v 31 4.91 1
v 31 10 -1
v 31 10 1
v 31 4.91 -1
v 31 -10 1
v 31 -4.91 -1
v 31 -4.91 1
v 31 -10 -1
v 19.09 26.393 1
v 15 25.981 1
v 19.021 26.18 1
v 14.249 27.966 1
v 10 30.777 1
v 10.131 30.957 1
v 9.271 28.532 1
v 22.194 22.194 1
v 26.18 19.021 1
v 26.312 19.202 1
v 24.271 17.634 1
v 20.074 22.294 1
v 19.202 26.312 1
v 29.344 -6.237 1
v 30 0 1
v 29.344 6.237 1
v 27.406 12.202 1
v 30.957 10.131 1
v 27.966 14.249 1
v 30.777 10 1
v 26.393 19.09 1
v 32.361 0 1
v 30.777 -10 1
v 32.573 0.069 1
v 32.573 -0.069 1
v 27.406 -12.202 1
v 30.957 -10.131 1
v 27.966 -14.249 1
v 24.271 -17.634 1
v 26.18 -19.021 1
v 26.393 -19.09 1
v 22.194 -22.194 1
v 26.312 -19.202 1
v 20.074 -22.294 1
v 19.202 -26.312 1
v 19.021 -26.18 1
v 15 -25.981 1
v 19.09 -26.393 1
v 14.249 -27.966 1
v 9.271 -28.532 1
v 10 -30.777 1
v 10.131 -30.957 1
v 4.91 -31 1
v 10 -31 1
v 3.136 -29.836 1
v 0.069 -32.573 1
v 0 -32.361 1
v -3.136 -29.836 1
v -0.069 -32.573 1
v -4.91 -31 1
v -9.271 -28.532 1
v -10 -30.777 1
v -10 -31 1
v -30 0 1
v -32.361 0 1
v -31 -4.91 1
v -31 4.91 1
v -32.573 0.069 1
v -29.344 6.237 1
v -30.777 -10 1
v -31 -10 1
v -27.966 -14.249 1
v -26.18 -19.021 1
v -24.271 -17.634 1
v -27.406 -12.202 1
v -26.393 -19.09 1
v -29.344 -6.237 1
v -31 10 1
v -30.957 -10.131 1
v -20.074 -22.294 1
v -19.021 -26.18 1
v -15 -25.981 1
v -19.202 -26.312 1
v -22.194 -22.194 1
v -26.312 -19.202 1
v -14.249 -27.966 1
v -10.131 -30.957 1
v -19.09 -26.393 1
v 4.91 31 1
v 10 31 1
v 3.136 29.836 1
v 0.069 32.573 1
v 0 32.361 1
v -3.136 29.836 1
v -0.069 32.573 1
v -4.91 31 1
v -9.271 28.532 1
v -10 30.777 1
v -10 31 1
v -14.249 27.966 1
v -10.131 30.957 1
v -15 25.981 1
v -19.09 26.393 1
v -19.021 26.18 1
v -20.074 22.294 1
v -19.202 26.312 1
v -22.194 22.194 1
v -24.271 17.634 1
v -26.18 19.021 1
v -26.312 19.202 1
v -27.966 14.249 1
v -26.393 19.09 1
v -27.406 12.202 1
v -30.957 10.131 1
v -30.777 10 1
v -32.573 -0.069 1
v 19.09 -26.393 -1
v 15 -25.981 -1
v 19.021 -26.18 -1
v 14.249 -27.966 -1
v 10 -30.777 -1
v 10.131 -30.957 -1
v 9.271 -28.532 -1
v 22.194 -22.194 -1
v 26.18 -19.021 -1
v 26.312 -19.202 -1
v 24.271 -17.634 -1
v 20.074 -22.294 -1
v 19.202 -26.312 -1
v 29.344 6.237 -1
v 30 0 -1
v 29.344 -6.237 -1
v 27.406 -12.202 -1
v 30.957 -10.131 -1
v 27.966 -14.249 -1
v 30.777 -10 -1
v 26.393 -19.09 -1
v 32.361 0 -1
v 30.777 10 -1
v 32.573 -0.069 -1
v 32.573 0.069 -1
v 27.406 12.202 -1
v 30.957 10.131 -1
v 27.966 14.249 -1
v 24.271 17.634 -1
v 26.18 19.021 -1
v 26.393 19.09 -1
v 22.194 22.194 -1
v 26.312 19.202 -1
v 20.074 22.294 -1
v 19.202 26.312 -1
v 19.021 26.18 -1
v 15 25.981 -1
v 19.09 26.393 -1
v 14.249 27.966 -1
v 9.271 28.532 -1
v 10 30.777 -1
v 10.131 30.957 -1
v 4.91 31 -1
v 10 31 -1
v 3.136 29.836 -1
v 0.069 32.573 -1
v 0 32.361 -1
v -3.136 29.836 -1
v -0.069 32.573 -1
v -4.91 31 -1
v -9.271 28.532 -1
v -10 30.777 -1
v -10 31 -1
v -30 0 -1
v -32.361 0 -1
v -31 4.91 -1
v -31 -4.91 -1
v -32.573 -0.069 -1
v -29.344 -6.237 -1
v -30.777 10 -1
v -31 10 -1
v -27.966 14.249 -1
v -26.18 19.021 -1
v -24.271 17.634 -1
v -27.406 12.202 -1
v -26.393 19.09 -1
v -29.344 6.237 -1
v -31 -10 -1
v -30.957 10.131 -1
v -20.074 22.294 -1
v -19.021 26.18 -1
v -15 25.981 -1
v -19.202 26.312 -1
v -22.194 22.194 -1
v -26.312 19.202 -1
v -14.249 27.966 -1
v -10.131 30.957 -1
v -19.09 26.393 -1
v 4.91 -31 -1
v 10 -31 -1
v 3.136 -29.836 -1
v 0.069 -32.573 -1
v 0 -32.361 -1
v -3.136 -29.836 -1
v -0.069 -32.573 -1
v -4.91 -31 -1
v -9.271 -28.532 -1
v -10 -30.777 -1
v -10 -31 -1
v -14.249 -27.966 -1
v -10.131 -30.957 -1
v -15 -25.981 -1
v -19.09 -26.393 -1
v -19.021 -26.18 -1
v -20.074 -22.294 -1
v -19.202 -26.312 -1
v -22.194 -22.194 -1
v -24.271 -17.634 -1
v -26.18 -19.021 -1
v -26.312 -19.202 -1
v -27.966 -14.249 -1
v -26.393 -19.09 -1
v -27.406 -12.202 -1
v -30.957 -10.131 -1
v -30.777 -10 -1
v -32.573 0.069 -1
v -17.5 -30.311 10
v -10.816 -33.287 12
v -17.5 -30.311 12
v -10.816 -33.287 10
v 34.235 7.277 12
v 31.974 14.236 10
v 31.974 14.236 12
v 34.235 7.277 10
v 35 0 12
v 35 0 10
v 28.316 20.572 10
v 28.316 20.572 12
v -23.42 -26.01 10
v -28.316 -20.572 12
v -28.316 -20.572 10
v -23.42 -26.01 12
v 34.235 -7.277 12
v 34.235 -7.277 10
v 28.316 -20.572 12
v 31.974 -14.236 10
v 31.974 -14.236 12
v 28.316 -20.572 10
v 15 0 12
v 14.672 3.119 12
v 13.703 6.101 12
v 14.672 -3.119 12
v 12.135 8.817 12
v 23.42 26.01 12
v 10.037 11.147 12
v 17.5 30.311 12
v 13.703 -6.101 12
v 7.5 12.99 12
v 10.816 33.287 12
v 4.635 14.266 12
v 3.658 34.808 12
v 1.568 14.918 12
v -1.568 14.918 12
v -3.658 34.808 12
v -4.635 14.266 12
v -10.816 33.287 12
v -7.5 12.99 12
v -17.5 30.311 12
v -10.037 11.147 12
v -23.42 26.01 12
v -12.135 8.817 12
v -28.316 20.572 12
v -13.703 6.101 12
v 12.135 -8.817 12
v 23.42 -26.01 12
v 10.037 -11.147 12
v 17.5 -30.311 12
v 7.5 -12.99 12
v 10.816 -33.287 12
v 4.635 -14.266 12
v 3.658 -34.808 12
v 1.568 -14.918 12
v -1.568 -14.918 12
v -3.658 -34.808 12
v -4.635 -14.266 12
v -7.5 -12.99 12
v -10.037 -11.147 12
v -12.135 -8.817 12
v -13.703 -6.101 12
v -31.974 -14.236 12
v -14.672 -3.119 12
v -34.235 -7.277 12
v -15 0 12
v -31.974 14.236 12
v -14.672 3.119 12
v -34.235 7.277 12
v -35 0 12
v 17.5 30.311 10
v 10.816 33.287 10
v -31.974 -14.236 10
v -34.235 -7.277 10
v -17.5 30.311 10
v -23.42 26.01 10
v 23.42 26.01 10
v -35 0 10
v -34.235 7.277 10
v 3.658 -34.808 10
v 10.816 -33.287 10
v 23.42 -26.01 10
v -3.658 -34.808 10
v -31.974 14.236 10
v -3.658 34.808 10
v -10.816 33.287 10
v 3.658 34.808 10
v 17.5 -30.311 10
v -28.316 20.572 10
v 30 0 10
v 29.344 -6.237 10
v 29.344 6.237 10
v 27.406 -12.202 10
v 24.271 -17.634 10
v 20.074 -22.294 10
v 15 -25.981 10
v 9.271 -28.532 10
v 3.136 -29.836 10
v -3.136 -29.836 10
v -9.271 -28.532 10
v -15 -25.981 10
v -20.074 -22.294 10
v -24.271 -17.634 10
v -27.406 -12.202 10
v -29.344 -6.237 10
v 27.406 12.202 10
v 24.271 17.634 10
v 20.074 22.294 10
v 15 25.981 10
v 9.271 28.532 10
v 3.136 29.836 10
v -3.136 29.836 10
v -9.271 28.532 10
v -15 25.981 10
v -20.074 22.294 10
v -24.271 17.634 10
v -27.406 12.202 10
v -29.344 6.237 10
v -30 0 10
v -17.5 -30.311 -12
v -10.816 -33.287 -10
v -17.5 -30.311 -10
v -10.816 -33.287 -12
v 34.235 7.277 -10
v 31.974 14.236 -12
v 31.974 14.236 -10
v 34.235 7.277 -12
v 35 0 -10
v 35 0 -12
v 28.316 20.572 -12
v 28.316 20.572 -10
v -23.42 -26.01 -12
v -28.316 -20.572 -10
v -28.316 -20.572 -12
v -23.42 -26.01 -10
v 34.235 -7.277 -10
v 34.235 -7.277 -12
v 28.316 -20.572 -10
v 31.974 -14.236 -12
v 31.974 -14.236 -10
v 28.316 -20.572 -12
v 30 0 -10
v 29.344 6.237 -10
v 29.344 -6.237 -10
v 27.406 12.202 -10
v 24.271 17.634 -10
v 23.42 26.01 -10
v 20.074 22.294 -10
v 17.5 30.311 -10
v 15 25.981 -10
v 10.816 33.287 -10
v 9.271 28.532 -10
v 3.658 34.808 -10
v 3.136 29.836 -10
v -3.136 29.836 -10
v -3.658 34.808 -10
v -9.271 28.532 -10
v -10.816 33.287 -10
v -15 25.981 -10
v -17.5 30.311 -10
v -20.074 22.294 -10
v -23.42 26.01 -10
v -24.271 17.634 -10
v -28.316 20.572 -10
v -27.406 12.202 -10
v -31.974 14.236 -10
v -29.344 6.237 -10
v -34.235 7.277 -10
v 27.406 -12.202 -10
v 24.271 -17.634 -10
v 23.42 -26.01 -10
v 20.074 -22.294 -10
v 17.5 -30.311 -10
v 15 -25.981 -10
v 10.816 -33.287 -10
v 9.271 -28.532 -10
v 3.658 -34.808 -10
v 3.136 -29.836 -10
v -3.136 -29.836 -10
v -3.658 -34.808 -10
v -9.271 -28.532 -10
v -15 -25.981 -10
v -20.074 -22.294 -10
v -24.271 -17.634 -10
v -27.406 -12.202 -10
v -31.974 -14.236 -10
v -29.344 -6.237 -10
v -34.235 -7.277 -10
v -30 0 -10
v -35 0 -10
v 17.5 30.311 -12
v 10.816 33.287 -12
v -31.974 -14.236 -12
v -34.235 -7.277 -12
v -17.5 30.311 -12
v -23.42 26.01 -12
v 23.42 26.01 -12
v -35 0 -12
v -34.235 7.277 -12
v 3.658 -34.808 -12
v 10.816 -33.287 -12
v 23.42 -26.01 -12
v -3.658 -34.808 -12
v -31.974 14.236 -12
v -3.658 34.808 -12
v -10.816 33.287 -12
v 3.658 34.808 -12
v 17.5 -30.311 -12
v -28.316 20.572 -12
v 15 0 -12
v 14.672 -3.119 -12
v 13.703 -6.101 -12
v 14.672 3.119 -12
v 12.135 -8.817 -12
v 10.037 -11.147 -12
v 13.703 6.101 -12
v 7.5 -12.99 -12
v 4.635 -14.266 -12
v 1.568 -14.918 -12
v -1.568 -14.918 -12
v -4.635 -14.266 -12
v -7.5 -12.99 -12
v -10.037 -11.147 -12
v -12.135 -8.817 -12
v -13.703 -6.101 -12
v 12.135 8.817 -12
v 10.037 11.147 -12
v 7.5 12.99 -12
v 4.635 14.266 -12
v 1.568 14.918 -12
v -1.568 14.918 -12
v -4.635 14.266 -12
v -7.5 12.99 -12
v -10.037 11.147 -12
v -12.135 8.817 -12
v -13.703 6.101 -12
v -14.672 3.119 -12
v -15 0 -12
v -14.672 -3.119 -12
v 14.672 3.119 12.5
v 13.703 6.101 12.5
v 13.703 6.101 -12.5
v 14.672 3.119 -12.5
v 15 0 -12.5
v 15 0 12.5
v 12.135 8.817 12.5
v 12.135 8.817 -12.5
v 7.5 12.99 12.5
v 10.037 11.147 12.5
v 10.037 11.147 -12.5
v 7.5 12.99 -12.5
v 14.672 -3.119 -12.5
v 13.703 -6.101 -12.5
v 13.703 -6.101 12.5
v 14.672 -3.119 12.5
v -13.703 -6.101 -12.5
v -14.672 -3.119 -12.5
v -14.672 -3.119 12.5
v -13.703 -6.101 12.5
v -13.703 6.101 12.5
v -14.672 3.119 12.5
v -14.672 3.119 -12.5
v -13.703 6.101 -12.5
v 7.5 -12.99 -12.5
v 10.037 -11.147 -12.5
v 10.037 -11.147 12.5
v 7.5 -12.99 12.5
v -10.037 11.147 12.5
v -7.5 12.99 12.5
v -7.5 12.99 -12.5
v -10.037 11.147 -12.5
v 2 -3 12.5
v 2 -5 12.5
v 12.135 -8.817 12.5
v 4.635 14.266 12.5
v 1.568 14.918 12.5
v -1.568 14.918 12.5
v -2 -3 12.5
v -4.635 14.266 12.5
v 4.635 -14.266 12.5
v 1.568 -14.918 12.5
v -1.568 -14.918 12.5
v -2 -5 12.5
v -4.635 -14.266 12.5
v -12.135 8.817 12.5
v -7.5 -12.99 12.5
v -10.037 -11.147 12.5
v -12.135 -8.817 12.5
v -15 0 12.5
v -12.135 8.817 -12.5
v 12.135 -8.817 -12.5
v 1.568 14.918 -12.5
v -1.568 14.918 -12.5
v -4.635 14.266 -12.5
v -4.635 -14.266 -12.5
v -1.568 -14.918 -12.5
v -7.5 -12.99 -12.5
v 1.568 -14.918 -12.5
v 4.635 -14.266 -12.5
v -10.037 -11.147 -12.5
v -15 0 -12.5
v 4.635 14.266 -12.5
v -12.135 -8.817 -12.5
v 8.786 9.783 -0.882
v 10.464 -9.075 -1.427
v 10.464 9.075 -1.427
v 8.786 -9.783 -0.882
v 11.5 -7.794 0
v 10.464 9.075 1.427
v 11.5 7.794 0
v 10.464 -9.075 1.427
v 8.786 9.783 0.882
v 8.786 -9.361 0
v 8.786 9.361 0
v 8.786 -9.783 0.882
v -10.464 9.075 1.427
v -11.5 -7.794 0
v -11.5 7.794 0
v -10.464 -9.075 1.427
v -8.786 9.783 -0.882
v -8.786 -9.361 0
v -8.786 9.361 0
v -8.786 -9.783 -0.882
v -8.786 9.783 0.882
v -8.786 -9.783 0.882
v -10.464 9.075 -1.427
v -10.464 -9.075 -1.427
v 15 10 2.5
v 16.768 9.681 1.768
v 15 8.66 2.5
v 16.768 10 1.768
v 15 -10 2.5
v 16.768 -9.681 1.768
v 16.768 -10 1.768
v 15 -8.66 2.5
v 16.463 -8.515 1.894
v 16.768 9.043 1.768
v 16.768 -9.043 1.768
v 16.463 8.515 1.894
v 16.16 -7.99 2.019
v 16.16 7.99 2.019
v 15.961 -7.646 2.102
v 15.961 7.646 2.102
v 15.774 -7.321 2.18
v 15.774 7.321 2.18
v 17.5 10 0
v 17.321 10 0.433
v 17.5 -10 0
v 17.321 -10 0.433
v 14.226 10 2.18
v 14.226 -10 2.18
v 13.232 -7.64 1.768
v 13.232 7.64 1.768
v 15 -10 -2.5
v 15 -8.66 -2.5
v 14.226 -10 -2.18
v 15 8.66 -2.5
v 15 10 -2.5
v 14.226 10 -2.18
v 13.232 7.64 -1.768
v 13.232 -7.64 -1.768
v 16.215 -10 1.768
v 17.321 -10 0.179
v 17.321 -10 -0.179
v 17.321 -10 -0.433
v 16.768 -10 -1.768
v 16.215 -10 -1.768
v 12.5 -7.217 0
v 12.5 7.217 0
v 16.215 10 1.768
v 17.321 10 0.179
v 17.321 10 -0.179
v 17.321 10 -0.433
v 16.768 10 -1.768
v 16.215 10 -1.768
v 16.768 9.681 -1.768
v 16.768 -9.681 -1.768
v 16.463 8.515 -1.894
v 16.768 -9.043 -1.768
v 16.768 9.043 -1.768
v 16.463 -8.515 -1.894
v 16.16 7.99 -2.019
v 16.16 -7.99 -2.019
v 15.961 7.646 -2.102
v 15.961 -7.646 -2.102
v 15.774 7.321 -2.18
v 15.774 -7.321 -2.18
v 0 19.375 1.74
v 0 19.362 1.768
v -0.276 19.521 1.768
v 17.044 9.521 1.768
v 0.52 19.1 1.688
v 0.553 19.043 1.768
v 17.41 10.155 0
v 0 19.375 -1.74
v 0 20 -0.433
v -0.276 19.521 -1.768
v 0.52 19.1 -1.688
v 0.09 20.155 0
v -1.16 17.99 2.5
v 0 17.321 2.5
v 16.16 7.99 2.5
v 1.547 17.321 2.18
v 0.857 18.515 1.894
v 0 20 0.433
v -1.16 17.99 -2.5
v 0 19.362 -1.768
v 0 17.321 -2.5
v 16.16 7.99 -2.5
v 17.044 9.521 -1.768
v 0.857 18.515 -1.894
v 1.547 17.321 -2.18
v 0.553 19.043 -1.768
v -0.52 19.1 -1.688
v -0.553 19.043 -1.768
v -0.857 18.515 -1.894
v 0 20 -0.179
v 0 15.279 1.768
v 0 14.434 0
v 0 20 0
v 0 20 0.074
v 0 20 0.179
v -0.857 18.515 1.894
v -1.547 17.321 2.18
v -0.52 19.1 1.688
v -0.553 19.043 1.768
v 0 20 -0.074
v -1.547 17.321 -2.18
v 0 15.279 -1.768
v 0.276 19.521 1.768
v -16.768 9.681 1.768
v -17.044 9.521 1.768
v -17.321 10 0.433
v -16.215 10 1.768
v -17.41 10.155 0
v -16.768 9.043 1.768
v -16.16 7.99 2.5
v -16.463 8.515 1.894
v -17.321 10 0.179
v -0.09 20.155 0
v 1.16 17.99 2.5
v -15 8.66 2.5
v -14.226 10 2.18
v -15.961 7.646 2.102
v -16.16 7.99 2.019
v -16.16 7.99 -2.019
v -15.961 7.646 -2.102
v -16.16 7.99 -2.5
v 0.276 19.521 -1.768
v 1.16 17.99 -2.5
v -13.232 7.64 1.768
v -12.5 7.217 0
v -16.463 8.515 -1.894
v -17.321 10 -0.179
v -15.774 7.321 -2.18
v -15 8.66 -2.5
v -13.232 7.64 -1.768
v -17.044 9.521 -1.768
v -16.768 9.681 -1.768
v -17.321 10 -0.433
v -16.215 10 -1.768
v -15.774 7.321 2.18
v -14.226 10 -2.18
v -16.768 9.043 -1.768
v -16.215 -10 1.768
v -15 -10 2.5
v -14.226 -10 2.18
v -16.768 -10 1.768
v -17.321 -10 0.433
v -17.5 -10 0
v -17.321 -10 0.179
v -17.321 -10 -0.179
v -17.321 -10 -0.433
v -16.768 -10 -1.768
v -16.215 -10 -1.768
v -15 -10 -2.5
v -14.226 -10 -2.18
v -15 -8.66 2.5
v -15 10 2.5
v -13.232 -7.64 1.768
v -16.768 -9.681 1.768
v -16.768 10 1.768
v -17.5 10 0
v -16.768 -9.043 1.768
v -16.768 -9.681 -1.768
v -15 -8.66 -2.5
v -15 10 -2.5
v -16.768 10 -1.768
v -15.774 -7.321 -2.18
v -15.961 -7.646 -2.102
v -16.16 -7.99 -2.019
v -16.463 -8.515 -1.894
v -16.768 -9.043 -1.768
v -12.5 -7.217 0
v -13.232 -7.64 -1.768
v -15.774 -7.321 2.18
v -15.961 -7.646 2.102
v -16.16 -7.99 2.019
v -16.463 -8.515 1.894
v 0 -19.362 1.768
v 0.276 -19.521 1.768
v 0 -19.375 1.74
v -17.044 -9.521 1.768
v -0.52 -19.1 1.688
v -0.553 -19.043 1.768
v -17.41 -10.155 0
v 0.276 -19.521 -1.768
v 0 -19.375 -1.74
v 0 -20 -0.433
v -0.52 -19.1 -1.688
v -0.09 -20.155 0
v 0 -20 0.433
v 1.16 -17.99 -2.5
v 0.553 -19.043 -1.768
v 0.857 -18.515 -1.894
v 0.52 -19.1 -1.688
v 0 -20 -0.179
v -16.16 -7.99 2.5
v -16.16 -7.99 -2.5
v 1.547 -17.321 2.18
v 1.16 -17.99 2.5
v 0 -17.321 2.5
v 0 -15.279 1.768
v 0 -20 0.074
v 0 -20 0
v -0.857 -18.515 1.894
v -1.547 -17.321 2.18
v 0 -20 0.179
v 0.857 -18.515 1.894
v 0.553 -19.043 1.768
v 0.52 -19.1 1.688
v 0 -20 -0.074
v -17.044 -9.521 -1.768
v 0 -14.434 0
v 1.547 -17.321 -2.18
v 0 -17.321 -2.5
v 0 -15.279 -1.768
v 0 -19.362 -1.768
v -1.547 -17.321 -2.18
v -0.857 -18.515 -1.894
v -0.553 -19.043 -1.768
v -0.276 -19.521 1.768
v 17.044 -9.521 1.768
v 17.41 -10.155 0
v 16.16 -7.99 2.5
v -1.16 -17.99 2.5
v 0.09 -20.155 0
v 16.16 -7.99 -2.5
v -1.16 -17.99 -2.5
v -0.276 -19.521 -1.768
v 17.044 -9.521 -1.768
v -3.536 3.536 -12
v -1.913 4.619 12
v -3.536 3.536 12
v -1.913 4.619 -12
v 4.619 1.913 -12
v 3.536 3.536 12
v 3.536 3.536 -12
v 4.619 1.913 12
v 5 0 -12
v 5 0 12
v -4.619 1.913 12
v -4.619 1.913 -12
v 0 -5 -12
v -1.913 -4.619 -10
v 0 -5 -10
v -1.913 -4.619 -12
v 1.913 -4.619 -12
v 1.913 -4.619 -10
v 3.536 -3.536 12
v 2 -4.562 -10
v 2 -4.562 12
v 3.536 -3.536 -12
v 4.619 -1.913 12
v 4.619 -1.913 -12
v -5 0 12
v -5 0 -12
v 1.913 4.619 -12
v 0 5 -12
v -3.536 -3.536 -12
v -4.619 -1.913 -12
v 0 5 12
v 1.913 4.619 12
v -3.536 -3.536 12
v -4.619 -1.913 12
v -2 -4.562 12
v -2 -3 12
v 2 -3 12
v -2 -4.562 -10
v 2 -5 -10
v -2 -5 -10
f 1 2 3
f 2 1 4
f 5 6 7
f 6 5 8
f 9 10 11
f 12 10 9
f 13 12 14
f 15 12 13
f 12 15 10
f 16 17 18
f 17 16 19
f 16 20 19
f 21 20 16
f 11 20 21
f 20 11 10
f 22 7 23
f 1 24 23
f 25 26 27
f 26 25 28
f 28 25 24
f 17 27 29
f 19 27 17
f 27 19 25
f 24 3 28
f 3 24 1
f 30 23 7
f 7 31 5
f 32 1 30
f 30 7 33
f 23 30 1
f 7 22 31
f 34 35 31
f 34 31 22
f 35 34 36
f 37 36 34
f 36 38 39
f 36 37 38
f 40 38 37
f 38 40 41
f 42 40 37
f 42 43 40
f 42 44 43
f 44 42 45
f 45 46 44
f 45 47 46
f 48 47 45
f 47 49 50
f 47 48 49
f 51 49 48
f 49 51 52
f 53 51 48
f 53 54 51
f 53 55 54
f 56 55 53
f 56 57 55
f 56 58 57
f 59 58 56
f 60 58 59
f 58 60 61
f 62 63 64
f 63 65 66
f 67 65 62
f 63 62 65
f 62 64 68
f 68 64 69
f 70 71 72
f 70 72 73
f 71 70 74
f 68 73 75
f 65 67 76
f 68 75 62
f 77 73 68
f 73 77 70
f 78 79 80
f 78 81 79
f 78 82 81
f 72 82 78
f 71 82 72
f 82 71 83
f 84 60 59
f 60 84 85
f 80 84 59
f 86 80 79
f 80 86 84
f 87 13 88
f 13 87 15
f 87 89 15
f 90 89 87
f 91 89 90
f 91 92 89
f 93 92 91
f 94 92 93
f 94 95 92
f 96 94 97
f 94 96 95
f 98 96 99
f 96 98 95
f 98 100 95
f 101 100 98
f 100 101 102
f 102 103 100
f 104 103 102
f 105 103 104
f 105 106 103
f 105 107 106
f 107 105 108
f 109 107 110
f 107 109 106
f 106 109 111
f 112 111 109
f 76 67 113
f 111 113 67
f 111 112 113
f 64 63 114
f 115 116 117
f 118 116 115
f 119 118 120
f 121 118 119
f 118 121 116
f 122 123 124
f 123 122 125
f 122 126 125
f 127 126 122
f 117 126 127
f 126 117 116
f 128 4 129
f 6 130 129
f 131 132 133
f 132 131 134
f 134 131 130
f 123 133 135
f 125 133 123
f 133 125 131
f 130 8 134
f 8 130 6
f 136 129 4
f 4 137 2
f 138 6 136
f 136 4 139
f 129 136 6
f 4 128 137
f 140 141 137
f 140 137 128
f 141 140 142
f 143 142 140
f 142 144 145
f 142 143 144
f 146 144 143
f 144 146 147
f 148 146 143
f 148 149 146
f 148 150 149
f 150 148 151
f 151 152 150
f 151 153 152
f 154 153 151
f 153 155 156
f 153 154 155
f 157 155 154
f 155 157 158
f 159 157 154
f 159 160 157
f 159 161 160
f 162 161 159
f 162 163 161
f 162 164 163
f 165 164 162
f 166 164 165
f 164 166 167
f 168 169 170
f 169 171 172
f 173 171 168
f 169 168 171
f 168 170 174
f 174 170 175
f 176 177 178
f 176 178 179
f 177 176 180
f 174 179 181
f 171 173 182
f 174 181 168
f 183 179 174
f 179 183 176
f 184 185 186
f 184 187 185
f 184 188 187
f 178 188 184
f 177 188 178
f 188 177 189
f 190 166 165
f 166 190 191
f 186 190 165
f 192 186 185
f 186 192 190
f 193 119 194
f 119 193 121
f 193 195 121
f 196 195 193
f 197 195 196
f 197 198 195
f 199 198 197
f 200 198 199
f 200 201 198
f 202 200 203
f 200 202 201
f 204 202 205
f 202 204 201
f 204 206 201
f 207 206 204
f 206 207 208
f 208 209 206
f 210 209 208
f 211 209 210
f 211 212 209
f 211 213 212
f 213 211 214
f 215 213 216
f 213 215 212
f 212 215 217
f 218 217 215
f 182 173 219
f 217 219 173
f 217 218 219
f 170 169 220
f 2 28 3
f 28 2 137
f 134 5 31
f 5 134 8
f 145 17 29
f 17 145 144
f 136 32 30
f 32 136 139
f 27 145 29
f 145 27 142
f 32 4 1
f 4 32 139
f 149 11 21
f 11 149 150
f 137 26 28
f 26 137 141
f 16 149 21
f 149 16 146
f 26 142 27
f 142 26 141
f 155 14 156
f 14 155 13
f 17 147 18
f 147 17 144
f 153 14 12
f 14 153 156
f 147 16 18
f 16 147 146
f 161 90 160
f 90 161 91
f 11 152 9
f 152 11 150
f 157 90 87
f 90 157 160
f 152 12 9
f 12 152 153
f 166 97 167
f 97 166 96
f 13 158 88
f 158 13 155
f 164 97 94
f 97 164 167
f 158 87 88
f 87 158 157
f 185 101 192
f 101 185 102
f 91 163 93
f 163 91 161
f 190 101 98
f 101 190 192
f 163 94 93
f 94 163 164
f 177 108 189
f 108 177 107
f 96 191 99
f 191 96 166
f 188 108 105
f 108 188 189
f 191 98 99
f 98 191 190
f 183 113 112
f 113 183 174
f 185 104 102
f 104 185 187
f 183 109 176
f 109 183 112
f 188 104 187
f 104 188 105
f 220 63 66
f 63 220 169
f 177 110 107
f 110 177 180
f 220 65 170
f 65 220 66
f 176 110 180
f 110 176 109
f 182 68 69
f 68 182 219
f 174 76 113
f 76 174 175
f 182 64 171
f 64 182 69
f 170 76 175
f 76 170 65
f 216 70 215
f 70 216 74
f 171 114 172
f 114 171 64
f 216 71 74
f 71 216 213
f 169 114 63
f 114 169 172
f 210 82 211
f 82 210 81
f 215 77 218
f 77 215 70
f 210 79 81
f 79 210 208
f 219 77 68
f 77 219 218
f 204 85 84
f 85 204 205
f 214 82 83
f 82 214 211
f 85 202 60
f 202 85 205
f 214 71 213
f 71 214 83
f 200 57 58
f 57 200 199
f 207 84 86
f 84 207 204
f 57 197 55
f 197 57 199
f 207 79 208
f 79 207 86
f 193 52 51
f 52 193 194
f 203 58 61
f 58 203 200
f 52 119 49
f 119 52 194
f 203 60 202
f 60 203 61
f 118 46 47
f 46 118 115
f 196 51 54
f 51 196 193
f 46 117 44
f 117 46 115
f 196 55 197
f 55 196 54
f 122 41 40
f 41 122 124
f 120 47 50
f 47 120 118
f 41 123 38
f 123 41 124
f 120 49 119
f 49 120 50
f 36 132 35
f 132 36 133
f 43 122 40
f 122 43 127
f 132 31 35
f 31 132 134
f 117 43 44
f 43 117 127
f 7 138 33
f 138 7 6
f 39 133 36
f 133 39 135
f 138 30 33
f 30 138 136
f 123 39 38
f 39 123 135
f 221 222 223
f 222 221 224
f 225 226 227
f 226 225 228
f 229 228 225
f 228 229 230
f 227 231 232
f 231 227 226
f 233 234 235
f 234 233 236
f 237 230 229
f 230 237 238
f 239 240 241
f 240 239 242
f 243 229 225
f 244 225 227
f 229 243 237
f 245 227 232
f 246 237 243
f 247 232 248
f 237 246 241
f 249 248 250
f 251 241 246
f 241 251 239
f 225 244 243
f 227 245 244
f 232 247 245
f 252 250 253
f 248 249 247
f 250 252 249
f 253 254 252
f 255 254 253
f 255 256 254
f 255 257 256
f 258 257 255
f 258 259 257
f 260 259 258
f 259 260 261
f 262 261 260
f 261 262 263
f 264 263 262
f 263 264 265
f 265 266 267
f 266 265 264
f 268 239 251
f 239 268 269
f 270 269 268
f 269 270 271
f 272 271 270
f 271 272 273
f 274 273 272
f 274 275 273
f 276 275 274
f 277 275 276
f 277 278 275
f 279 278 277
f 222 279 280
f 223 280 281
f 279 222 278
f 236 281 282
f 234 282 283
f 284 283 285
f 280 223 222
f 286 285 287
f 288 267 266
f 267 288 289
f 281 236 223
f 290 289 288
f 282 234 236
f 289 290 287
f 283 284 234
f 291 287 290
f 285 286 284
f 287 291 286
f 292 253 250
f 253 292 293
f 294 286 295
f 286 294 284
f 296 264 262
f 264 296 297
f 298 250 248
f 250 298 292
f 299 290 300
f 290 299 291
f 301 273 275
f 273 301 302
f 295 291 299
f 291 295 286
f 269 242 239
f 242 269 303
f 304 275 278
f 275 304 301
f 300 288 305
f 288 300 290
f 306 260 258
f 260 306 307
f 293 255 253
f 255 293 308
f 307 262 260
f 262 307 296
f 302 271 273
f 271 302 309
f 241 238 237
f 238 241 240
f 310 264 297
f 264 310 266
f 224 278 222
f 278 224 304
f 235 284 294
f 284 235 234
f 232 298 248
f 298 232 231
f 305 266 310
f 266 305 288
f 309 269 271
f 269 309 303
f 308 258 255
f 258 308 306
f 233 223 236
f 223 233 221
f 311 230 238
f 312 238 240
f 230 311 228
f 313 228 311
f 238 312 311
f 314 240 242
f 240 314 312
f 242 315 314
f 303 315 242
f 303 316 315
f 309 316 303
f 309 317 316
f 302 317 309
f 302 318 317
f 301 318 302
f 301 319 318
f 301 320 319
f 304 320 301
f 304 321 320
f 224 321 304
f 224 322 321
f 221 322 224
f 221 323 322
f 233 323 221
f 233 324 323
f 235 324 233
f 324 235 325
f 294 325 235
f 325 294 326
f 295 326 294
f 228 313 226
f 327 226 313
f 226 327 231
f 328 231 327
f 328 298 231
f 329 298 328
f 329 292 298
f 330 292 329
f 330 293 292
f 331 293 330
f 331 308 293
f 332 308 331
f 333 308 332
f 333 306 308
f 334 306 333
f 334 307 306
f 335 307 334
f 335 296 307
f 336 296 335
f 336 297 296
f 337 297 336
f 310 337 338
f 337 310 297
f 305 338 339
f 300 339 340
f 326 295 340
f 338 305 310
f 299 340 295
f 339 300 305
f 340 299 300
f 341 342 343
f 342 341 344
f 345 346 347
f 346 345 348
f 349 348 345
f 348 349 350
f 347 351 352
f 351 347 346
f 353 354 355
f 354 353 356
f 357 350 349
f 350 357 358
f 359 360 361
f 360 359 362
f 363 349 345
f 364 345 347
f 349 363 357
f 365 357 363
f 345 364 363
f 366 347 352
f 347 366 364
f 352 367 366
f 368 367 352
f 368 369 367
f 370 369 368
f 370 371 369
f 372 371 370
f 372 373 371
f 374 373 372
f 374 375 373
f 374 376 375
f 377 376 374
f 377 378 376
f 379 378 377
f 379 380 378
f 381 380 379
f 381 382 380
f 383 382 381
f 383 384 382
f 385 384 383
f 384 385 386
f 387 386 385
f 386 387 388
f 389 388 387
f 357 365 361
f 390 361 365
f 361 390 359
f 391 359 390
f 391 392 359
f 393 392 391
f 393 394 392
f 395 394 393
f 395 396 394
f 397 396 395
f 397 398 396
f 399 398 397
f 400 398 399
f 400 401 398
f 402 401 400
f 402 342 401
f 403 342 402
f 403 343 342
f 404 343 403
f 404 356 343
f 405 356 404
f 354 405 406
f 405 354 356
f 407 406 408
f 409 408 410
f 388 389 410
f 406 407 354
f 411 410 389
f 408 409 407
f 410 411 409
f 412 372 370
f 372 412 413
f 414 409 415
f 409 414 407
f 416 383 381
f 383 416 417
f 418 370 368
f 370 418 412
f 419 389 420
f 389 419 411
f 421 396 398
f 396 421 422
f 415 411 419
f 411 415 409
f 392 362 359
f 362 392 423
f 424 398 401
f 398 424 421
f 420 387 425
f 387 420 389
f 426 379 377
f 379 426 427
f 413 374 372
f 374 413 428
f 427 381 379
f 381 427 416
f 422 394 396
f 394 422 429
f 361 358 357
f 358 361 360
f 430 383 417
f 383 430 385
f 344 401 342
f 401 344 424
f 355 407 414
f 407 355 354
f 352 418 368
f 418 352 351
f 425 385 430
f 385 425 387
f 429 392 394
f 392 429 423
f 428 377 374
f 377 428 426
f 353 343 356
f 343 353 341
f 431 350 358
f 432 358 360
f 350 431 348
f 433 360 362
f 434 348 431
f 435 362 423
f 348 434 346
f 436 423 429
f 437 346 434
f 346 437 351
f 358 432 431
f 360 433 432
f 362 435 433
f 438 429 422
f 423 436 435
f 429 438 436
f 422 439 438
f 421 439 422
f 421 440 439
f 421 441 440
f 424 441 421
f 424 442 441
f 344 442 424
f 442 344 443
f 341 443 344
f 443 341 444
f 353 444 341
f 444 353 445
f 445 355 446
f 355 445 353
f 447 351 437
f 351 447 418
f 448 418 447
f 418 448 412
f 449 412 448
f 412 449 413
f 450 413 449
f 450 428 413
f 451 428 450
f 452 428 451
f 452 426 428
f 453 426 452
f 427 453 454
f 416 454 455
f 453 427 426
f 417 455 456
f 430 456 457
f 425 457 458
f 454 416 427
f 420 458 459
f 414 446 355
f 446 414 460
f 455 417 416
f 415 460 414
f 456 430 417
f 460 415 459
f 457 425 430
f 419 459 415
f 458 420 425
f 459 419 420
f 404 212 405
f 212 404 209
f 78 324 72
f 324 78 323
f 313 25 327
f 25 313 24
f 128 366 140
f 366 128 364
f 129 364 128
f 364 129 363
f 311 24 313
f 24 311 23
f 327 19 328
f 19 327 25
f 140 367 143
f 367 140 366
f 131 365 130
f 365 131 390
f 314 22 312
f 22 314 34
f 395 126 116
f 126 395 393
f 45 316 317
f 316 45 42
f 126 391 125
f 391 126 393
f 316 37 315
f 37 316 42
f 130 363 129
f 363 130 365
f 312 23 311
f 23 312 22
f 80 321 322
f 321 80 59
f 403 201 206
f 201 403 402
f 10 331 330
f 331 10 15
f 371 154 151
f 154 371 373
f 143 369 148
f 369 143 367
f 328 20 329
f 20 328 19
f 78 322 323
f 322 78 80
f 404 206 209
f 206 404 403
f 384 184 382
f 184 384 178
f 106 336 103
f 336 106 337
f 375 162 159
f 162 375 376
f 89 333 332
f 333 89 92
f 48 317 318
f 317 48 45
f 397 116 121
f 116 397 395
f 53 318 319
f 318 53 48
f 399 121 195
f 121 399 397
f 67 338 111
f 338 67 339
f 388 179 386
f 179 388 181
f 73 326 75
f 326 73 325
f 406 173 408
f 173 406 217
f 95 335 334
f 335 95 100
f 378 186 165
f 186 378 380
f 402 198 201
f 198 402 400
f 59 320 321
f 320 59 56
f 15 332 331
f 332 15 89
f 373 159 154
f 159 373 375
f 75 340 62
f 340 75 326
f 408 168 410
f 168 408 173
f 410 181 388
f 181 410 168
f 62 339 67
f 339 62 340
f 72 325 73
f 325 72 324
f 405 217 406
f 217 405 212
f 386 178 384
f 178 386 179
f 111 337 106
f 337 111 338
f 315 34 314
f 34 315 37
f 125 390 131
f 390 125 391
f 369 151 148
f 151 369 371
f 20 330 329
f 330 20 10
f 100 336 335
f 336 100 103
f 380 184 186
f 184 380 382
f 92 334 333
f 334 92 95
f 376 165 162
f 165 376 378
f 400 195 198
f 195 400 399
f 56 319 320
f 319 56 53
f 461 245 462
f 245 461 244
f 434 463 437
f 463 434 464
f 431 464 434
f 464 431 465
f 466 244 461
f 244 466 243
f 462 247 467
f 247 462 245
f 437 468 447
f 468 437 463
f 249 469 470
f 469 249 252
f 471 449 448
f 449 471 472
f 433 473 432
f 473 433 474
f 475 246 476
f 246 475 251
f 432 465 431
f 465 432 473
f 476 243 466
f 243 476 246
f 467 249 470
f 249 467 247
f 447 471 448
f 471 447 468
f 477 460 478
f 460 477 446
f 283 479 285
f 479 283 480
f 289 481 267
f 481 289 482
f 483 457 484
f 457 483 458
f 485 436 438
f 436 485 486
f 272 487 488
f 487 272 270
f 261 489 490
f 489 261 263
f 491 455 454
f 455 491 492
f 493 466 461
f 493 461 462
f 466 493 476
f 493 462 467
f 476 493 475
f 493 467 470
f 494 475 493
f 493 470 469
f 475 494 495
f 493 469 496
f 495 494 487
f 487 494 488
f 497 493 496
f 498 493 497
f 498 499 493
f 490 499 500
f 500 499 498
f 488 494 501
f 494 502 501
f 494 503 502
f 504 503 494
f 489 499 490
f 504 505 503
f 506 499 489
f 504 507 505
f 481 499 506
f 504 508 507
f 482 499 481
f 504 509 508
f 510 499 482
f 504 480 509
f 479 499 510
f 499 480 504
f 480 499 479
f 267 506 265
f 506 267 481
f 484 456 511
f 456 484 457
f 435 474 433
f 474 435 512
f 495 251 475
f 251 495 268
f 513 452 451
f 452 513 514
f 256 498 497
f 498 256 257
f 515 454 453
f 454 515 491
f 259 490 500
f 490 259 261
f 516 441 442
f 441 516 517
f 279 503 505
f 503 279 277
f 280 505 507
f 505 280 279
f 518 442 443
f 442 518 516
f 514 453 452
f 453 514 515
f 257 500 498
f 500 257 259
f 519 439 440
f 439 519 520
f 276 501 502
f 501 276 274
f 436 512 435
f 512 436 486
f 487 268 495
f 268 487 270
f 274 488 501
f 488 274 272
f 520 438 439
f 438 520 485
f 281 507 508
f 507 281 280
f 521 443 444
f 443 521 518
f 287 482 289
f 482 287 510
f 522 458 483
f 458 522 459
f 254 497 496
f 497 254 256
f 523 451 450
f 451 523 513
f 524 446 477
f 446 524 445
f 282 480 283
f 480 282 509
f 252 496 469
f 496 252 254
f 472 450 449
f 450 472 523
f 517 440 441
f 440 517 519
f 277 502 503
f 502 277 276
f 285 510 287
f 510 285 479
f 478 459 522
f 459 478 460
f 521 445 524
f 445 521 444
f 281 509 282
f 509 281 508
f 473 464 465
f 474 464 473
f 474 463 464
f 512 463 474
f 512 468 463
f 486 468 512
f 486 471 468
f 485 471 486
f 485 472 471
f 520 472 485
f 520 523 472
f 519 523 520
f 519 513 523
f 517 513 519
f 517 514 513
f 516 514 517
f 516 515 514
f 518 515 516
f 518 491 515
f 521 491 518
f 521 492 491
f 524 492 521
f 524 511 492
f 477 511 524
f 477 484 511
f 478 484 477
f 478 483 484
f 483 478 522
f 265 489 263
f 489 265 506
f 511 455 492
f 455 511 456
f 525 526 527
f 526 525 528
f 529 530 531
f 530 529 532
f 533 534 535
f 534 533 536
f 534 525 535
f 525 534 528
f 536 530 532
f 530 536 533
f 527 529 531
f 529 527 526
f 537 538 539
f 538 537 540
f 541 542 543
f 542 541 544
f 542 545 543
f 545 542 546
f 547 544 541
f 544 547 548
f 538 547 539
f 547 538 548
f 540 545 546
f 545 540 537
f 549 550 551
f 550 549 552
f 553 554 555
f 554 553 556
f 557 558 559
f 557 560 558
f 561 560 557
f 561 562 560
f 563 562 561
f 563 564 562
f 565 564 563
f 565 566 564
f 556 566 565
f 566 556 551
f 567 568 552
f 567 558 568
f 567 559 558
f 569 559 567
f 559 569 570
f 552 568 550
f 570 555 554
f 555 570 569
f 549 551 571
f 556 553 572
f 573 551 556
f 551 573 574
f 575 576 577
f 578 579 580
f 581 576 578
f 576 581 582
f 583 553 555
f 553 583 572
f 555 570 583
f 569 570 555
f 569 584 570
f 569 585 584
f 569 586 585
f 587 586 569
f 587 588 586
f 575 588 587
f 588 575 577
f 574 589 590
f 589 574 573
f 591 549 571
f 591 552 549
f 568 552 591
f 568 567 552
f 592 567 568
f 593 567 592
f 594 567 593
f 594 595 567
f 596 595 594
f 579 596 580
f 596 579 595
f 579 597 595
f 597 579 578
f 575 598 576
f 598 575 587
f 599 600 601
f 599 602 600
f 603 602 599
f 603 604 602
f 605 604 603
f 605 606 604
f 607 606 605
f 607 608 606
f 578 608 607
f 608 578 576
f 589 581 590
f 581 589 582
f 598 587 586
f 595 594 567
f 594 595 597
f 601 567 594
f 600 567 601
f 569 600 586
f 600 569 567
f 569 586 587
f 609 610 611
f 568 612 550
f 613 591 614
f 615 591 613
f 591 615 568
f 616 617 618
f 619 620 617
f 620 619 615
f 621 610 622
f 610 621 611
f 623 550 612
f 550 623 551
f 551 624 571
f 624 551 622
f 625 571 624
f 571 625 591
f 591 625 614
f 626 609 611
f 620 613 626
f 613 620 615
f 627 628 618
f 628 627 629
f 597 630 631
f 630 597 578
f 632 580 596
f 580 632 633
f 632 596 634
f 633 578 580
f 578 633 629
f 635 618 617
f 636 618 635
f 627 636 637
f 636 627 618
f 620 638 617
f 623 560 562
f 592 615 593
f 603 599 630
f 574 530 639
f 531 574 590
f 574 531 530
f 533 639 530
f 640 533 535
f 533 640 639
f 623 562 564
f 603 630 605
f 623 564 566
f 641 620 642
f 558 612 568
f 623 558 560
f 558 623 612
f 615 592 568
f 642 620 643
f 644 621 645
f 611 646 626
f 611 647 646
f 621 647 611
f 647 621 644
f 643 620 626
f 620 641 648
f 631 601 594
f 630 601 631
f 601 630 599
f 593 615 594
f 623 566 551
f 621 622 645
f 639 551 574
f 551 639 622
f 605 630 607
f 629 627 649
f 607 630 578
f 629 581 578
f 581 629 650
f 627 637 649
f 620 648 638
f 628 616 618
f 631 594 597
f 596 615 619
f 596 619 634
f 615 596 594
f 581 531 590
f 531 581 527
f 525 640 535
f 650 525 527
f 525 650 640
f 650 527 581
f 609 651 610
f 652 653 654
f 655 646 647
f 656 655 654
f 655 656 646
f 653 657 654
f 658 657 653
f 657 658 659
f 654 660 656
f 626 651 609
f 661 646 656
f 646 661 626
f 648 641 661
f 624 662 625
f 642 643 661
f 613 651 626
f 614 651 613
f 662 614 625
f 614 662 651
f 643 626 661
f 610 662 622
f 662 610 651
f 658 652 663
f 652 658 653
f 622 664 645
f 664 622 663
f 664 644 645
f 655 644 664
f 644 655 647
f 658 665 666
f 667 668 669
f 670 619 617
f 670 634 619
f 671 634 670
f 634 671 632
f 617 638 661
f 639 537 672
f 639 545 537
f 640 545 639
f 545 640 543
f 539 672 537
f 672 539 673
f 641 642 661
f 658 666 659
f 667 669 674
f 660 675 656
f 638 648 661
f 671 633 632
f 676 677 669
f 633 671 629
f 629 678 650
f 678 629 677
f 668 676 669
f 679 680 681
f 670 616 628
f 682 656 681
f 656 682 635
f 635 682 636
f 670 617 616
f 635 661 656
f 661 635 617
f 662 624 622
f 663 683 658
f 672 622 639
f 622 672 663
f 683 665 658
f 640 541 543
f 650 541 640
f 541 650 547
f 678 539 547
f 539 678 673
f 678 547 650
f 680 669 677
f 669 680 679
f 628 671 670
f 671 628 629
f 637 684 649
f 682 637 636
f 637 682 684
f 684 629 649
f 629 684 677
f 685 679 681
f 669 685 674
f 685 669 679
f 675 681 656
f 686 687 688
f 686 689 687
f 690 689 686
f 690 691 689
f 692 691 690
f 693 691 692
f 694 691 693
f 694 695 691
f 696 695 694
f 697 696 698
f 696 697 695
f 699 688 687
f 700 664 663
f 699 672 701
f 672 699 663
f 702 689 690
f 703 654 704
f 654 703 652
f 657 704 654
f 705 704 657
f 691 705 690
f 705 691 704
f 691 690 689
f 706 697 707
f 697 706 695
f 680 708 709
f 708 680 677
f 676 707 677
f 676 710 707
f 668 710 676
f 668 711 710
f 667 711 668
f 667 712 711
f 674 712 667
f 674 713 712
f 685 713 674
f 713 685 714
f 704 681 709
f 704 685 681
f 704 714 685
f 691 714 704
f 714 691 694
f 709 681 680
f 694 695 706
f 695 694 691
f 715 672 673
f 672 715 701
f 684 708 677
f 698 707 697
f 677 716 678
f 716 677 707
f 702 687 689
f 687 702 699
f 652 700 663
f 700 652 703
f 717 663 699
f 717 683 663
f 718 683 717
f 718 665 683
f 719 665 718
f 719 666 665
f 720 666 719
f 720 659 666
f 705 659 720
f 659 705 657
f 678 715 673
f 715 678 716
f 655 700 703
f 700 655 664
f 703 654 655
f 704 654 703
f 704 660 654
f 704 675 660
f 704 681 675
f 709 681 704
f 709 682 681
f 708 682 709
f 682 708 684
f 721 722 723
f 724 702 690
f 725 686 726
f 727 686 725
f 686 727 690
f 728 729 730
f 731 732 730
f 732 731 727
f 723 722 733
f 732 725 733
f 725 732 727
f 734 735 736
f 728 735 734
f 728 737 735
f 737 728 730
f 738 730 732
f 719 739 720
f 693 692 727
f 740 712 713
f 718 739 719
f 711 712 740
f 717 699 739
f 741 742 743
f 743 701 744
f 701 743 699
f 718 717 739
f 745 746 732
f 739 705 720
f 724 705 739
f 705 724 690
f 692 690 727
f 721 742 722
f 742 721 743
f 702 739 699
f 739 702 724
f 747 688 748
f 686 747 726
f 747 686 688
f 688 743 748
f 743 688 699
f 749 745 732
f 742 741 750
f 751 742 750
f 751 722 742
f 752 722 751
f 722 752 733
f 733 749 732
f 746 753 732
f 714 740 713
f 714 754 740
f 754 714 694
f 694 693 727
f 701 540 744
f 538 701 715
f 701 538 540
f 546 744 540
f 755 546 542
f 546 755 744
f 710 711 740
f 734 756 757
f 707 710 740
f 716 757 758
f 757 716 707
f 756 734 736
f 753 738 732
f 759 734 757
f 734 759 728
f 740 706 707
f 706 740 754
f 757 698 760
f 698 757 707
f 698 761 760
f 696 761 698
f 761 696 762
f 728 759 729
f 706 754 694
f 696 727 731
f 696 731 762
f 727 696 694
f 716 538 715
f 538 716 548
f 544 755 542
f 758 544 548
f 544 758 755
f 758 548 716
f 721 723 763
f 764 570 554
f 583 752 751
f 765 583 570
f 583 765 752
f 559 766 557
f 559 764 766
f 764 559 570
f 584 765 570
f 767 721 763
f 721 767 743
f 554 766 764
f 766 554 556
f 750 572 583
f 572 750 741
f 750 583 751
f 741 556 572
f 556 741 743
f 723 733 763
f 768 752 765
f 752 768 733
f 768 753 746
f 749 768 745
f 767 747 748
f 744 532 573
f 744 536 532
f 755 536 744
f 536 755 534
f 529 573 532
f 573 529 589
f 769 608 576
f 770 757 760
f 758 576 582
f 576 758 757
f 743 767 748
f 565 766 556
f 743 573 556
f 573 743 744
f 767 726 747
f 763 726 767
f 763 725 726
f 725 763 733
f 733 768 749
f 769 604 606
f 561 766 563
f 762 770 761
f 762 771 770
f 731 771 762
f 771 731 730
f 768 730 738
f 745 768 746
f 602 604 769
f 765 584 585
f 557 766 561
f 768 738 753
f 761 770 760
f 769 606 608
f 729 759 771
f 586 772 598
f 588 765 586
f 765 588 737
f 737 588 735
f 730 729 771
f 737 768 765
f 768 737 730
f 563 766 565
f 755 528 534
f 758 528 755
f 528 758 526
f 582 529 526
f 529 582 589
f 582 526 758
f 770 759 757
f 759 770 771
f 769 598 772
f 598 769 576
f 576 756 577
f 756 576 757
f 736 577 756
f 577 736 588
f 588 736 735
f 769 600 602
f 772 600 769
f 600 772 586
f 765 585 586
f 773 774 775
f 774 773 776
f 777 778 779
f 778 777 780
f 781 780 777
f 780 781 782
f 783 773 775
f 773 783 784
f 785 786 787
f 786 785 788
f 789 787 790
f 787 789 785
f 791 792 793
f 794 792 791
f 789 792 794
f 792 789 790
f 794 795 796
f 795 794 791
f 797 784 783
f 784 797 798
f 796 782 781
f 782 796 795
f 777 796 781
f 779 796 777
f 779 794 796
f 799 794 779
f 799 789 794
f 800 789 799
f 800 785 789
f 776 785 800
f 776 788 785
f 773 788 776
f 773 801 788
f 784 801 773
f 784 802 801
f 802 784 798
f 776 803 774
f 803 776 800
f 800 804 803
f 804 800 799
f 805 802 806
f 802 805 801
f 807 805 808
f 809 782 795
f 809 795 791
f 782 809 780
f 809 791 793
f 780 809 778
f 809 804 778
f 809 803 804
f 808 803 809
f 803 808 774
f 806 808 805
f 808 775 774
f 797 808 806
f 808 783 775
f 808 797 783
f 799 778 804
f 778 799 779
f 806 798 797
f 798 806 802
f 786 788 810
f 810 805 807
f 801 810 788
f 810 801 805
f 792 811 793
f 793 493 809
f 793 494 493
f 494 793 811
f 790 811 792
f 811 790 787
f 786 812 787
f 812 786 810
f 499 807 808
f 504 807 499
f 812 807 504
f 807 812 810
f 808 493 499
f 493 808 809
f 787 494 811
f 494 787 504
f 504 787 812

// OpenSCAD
// Parameters
pulley_diameter = 60;
pulley_width = 20;
bore_diameter = 10;
hub_diameter = 30;
hub_length = 25;
flange_thickness = 2;
flange_diameter = pulley_diameter + 10;
tooth_height = 2;
tooth_count = 20;
set_screw_diameter = 3;
set_screw_distance = 5;
keyway_width = 4;
keyway_depth = 2;
lightening_hole_diameter = 5;
lightening_hole_count = 6;

// Main pulley body
module pulley_body() {
    cylinder(d=pulley_diameter, h=pulley_width, center=true);
}

// Belt profile (toothed)
module belt_profile() {
    for (i = [0:tooth_count-1]) {
        rotate([0, 0, i * 360 / tooth_count])
        translate([pulley_diameter/2, 0, 0])
        cube([tooth_height, pulley_width, tooth_height], center=true);
    }
}

// Center bore
module center_bore() {
    cylinder(d=bore_diameter, h=pulley_width + 2*flange_thickness, center=true);
}

// Hub
module hub() {
    translate([0, 0, -hub_length/2])
    cylinder(d=hub_diameter, h=hub_length, center=false);
}

// Flanges
module flanges() {
    translate([0, 0, pulley_width/2])
    cylinder(d=flange_diameter, h=flange_thickness, center=false);
    translate([0, 0, -pulley_width/2 - flange_thickness])
    cylinder(d=flange_diameter, h=flange_thickness, center=false);
}

// Set screw holes
module set_screw_holes() {
    for (i = [0:1]) {
        rotate([0, 0, i * 180])
        translate([hub_diameter/2 - set_screw_distance, 0, 0])
        rotate([90, 0, 0])
        cylinder(d=set_screw_diameter, h=hub_length, center=true);
    }
}

// Keyway or flat
module keyway_or_flat() {
    translate([-keyway_width/2, -bore_diameter/2, -pulley_width/2])
    cube([keyway_width, keyway_depth, pulley_width + 2*flange_thickness]);
}

// Lightening holes
module lightening_holes() {
    for (i = [0:lightening_hole_count-1]) {
        rotate([0, 0, i * 360 / lightening_hole_count])
        translate([pulley_diameter/4, 0, 0])
        rotate([90, 0, 0])
        cylinder(d=lightening_hole_diameter, h=pulley_width, center=true);
    }
}

// Pulley assembly
module pulley() {
    difference() {
        union() {
            pulley_body();
            belt_profile();
            hub();
            flanges();
        }
        center_bore();
        set_screw_holes();
        keyway_or_flat();
        lightening_holes();
    }
}

// Render the pulley
pulley();
